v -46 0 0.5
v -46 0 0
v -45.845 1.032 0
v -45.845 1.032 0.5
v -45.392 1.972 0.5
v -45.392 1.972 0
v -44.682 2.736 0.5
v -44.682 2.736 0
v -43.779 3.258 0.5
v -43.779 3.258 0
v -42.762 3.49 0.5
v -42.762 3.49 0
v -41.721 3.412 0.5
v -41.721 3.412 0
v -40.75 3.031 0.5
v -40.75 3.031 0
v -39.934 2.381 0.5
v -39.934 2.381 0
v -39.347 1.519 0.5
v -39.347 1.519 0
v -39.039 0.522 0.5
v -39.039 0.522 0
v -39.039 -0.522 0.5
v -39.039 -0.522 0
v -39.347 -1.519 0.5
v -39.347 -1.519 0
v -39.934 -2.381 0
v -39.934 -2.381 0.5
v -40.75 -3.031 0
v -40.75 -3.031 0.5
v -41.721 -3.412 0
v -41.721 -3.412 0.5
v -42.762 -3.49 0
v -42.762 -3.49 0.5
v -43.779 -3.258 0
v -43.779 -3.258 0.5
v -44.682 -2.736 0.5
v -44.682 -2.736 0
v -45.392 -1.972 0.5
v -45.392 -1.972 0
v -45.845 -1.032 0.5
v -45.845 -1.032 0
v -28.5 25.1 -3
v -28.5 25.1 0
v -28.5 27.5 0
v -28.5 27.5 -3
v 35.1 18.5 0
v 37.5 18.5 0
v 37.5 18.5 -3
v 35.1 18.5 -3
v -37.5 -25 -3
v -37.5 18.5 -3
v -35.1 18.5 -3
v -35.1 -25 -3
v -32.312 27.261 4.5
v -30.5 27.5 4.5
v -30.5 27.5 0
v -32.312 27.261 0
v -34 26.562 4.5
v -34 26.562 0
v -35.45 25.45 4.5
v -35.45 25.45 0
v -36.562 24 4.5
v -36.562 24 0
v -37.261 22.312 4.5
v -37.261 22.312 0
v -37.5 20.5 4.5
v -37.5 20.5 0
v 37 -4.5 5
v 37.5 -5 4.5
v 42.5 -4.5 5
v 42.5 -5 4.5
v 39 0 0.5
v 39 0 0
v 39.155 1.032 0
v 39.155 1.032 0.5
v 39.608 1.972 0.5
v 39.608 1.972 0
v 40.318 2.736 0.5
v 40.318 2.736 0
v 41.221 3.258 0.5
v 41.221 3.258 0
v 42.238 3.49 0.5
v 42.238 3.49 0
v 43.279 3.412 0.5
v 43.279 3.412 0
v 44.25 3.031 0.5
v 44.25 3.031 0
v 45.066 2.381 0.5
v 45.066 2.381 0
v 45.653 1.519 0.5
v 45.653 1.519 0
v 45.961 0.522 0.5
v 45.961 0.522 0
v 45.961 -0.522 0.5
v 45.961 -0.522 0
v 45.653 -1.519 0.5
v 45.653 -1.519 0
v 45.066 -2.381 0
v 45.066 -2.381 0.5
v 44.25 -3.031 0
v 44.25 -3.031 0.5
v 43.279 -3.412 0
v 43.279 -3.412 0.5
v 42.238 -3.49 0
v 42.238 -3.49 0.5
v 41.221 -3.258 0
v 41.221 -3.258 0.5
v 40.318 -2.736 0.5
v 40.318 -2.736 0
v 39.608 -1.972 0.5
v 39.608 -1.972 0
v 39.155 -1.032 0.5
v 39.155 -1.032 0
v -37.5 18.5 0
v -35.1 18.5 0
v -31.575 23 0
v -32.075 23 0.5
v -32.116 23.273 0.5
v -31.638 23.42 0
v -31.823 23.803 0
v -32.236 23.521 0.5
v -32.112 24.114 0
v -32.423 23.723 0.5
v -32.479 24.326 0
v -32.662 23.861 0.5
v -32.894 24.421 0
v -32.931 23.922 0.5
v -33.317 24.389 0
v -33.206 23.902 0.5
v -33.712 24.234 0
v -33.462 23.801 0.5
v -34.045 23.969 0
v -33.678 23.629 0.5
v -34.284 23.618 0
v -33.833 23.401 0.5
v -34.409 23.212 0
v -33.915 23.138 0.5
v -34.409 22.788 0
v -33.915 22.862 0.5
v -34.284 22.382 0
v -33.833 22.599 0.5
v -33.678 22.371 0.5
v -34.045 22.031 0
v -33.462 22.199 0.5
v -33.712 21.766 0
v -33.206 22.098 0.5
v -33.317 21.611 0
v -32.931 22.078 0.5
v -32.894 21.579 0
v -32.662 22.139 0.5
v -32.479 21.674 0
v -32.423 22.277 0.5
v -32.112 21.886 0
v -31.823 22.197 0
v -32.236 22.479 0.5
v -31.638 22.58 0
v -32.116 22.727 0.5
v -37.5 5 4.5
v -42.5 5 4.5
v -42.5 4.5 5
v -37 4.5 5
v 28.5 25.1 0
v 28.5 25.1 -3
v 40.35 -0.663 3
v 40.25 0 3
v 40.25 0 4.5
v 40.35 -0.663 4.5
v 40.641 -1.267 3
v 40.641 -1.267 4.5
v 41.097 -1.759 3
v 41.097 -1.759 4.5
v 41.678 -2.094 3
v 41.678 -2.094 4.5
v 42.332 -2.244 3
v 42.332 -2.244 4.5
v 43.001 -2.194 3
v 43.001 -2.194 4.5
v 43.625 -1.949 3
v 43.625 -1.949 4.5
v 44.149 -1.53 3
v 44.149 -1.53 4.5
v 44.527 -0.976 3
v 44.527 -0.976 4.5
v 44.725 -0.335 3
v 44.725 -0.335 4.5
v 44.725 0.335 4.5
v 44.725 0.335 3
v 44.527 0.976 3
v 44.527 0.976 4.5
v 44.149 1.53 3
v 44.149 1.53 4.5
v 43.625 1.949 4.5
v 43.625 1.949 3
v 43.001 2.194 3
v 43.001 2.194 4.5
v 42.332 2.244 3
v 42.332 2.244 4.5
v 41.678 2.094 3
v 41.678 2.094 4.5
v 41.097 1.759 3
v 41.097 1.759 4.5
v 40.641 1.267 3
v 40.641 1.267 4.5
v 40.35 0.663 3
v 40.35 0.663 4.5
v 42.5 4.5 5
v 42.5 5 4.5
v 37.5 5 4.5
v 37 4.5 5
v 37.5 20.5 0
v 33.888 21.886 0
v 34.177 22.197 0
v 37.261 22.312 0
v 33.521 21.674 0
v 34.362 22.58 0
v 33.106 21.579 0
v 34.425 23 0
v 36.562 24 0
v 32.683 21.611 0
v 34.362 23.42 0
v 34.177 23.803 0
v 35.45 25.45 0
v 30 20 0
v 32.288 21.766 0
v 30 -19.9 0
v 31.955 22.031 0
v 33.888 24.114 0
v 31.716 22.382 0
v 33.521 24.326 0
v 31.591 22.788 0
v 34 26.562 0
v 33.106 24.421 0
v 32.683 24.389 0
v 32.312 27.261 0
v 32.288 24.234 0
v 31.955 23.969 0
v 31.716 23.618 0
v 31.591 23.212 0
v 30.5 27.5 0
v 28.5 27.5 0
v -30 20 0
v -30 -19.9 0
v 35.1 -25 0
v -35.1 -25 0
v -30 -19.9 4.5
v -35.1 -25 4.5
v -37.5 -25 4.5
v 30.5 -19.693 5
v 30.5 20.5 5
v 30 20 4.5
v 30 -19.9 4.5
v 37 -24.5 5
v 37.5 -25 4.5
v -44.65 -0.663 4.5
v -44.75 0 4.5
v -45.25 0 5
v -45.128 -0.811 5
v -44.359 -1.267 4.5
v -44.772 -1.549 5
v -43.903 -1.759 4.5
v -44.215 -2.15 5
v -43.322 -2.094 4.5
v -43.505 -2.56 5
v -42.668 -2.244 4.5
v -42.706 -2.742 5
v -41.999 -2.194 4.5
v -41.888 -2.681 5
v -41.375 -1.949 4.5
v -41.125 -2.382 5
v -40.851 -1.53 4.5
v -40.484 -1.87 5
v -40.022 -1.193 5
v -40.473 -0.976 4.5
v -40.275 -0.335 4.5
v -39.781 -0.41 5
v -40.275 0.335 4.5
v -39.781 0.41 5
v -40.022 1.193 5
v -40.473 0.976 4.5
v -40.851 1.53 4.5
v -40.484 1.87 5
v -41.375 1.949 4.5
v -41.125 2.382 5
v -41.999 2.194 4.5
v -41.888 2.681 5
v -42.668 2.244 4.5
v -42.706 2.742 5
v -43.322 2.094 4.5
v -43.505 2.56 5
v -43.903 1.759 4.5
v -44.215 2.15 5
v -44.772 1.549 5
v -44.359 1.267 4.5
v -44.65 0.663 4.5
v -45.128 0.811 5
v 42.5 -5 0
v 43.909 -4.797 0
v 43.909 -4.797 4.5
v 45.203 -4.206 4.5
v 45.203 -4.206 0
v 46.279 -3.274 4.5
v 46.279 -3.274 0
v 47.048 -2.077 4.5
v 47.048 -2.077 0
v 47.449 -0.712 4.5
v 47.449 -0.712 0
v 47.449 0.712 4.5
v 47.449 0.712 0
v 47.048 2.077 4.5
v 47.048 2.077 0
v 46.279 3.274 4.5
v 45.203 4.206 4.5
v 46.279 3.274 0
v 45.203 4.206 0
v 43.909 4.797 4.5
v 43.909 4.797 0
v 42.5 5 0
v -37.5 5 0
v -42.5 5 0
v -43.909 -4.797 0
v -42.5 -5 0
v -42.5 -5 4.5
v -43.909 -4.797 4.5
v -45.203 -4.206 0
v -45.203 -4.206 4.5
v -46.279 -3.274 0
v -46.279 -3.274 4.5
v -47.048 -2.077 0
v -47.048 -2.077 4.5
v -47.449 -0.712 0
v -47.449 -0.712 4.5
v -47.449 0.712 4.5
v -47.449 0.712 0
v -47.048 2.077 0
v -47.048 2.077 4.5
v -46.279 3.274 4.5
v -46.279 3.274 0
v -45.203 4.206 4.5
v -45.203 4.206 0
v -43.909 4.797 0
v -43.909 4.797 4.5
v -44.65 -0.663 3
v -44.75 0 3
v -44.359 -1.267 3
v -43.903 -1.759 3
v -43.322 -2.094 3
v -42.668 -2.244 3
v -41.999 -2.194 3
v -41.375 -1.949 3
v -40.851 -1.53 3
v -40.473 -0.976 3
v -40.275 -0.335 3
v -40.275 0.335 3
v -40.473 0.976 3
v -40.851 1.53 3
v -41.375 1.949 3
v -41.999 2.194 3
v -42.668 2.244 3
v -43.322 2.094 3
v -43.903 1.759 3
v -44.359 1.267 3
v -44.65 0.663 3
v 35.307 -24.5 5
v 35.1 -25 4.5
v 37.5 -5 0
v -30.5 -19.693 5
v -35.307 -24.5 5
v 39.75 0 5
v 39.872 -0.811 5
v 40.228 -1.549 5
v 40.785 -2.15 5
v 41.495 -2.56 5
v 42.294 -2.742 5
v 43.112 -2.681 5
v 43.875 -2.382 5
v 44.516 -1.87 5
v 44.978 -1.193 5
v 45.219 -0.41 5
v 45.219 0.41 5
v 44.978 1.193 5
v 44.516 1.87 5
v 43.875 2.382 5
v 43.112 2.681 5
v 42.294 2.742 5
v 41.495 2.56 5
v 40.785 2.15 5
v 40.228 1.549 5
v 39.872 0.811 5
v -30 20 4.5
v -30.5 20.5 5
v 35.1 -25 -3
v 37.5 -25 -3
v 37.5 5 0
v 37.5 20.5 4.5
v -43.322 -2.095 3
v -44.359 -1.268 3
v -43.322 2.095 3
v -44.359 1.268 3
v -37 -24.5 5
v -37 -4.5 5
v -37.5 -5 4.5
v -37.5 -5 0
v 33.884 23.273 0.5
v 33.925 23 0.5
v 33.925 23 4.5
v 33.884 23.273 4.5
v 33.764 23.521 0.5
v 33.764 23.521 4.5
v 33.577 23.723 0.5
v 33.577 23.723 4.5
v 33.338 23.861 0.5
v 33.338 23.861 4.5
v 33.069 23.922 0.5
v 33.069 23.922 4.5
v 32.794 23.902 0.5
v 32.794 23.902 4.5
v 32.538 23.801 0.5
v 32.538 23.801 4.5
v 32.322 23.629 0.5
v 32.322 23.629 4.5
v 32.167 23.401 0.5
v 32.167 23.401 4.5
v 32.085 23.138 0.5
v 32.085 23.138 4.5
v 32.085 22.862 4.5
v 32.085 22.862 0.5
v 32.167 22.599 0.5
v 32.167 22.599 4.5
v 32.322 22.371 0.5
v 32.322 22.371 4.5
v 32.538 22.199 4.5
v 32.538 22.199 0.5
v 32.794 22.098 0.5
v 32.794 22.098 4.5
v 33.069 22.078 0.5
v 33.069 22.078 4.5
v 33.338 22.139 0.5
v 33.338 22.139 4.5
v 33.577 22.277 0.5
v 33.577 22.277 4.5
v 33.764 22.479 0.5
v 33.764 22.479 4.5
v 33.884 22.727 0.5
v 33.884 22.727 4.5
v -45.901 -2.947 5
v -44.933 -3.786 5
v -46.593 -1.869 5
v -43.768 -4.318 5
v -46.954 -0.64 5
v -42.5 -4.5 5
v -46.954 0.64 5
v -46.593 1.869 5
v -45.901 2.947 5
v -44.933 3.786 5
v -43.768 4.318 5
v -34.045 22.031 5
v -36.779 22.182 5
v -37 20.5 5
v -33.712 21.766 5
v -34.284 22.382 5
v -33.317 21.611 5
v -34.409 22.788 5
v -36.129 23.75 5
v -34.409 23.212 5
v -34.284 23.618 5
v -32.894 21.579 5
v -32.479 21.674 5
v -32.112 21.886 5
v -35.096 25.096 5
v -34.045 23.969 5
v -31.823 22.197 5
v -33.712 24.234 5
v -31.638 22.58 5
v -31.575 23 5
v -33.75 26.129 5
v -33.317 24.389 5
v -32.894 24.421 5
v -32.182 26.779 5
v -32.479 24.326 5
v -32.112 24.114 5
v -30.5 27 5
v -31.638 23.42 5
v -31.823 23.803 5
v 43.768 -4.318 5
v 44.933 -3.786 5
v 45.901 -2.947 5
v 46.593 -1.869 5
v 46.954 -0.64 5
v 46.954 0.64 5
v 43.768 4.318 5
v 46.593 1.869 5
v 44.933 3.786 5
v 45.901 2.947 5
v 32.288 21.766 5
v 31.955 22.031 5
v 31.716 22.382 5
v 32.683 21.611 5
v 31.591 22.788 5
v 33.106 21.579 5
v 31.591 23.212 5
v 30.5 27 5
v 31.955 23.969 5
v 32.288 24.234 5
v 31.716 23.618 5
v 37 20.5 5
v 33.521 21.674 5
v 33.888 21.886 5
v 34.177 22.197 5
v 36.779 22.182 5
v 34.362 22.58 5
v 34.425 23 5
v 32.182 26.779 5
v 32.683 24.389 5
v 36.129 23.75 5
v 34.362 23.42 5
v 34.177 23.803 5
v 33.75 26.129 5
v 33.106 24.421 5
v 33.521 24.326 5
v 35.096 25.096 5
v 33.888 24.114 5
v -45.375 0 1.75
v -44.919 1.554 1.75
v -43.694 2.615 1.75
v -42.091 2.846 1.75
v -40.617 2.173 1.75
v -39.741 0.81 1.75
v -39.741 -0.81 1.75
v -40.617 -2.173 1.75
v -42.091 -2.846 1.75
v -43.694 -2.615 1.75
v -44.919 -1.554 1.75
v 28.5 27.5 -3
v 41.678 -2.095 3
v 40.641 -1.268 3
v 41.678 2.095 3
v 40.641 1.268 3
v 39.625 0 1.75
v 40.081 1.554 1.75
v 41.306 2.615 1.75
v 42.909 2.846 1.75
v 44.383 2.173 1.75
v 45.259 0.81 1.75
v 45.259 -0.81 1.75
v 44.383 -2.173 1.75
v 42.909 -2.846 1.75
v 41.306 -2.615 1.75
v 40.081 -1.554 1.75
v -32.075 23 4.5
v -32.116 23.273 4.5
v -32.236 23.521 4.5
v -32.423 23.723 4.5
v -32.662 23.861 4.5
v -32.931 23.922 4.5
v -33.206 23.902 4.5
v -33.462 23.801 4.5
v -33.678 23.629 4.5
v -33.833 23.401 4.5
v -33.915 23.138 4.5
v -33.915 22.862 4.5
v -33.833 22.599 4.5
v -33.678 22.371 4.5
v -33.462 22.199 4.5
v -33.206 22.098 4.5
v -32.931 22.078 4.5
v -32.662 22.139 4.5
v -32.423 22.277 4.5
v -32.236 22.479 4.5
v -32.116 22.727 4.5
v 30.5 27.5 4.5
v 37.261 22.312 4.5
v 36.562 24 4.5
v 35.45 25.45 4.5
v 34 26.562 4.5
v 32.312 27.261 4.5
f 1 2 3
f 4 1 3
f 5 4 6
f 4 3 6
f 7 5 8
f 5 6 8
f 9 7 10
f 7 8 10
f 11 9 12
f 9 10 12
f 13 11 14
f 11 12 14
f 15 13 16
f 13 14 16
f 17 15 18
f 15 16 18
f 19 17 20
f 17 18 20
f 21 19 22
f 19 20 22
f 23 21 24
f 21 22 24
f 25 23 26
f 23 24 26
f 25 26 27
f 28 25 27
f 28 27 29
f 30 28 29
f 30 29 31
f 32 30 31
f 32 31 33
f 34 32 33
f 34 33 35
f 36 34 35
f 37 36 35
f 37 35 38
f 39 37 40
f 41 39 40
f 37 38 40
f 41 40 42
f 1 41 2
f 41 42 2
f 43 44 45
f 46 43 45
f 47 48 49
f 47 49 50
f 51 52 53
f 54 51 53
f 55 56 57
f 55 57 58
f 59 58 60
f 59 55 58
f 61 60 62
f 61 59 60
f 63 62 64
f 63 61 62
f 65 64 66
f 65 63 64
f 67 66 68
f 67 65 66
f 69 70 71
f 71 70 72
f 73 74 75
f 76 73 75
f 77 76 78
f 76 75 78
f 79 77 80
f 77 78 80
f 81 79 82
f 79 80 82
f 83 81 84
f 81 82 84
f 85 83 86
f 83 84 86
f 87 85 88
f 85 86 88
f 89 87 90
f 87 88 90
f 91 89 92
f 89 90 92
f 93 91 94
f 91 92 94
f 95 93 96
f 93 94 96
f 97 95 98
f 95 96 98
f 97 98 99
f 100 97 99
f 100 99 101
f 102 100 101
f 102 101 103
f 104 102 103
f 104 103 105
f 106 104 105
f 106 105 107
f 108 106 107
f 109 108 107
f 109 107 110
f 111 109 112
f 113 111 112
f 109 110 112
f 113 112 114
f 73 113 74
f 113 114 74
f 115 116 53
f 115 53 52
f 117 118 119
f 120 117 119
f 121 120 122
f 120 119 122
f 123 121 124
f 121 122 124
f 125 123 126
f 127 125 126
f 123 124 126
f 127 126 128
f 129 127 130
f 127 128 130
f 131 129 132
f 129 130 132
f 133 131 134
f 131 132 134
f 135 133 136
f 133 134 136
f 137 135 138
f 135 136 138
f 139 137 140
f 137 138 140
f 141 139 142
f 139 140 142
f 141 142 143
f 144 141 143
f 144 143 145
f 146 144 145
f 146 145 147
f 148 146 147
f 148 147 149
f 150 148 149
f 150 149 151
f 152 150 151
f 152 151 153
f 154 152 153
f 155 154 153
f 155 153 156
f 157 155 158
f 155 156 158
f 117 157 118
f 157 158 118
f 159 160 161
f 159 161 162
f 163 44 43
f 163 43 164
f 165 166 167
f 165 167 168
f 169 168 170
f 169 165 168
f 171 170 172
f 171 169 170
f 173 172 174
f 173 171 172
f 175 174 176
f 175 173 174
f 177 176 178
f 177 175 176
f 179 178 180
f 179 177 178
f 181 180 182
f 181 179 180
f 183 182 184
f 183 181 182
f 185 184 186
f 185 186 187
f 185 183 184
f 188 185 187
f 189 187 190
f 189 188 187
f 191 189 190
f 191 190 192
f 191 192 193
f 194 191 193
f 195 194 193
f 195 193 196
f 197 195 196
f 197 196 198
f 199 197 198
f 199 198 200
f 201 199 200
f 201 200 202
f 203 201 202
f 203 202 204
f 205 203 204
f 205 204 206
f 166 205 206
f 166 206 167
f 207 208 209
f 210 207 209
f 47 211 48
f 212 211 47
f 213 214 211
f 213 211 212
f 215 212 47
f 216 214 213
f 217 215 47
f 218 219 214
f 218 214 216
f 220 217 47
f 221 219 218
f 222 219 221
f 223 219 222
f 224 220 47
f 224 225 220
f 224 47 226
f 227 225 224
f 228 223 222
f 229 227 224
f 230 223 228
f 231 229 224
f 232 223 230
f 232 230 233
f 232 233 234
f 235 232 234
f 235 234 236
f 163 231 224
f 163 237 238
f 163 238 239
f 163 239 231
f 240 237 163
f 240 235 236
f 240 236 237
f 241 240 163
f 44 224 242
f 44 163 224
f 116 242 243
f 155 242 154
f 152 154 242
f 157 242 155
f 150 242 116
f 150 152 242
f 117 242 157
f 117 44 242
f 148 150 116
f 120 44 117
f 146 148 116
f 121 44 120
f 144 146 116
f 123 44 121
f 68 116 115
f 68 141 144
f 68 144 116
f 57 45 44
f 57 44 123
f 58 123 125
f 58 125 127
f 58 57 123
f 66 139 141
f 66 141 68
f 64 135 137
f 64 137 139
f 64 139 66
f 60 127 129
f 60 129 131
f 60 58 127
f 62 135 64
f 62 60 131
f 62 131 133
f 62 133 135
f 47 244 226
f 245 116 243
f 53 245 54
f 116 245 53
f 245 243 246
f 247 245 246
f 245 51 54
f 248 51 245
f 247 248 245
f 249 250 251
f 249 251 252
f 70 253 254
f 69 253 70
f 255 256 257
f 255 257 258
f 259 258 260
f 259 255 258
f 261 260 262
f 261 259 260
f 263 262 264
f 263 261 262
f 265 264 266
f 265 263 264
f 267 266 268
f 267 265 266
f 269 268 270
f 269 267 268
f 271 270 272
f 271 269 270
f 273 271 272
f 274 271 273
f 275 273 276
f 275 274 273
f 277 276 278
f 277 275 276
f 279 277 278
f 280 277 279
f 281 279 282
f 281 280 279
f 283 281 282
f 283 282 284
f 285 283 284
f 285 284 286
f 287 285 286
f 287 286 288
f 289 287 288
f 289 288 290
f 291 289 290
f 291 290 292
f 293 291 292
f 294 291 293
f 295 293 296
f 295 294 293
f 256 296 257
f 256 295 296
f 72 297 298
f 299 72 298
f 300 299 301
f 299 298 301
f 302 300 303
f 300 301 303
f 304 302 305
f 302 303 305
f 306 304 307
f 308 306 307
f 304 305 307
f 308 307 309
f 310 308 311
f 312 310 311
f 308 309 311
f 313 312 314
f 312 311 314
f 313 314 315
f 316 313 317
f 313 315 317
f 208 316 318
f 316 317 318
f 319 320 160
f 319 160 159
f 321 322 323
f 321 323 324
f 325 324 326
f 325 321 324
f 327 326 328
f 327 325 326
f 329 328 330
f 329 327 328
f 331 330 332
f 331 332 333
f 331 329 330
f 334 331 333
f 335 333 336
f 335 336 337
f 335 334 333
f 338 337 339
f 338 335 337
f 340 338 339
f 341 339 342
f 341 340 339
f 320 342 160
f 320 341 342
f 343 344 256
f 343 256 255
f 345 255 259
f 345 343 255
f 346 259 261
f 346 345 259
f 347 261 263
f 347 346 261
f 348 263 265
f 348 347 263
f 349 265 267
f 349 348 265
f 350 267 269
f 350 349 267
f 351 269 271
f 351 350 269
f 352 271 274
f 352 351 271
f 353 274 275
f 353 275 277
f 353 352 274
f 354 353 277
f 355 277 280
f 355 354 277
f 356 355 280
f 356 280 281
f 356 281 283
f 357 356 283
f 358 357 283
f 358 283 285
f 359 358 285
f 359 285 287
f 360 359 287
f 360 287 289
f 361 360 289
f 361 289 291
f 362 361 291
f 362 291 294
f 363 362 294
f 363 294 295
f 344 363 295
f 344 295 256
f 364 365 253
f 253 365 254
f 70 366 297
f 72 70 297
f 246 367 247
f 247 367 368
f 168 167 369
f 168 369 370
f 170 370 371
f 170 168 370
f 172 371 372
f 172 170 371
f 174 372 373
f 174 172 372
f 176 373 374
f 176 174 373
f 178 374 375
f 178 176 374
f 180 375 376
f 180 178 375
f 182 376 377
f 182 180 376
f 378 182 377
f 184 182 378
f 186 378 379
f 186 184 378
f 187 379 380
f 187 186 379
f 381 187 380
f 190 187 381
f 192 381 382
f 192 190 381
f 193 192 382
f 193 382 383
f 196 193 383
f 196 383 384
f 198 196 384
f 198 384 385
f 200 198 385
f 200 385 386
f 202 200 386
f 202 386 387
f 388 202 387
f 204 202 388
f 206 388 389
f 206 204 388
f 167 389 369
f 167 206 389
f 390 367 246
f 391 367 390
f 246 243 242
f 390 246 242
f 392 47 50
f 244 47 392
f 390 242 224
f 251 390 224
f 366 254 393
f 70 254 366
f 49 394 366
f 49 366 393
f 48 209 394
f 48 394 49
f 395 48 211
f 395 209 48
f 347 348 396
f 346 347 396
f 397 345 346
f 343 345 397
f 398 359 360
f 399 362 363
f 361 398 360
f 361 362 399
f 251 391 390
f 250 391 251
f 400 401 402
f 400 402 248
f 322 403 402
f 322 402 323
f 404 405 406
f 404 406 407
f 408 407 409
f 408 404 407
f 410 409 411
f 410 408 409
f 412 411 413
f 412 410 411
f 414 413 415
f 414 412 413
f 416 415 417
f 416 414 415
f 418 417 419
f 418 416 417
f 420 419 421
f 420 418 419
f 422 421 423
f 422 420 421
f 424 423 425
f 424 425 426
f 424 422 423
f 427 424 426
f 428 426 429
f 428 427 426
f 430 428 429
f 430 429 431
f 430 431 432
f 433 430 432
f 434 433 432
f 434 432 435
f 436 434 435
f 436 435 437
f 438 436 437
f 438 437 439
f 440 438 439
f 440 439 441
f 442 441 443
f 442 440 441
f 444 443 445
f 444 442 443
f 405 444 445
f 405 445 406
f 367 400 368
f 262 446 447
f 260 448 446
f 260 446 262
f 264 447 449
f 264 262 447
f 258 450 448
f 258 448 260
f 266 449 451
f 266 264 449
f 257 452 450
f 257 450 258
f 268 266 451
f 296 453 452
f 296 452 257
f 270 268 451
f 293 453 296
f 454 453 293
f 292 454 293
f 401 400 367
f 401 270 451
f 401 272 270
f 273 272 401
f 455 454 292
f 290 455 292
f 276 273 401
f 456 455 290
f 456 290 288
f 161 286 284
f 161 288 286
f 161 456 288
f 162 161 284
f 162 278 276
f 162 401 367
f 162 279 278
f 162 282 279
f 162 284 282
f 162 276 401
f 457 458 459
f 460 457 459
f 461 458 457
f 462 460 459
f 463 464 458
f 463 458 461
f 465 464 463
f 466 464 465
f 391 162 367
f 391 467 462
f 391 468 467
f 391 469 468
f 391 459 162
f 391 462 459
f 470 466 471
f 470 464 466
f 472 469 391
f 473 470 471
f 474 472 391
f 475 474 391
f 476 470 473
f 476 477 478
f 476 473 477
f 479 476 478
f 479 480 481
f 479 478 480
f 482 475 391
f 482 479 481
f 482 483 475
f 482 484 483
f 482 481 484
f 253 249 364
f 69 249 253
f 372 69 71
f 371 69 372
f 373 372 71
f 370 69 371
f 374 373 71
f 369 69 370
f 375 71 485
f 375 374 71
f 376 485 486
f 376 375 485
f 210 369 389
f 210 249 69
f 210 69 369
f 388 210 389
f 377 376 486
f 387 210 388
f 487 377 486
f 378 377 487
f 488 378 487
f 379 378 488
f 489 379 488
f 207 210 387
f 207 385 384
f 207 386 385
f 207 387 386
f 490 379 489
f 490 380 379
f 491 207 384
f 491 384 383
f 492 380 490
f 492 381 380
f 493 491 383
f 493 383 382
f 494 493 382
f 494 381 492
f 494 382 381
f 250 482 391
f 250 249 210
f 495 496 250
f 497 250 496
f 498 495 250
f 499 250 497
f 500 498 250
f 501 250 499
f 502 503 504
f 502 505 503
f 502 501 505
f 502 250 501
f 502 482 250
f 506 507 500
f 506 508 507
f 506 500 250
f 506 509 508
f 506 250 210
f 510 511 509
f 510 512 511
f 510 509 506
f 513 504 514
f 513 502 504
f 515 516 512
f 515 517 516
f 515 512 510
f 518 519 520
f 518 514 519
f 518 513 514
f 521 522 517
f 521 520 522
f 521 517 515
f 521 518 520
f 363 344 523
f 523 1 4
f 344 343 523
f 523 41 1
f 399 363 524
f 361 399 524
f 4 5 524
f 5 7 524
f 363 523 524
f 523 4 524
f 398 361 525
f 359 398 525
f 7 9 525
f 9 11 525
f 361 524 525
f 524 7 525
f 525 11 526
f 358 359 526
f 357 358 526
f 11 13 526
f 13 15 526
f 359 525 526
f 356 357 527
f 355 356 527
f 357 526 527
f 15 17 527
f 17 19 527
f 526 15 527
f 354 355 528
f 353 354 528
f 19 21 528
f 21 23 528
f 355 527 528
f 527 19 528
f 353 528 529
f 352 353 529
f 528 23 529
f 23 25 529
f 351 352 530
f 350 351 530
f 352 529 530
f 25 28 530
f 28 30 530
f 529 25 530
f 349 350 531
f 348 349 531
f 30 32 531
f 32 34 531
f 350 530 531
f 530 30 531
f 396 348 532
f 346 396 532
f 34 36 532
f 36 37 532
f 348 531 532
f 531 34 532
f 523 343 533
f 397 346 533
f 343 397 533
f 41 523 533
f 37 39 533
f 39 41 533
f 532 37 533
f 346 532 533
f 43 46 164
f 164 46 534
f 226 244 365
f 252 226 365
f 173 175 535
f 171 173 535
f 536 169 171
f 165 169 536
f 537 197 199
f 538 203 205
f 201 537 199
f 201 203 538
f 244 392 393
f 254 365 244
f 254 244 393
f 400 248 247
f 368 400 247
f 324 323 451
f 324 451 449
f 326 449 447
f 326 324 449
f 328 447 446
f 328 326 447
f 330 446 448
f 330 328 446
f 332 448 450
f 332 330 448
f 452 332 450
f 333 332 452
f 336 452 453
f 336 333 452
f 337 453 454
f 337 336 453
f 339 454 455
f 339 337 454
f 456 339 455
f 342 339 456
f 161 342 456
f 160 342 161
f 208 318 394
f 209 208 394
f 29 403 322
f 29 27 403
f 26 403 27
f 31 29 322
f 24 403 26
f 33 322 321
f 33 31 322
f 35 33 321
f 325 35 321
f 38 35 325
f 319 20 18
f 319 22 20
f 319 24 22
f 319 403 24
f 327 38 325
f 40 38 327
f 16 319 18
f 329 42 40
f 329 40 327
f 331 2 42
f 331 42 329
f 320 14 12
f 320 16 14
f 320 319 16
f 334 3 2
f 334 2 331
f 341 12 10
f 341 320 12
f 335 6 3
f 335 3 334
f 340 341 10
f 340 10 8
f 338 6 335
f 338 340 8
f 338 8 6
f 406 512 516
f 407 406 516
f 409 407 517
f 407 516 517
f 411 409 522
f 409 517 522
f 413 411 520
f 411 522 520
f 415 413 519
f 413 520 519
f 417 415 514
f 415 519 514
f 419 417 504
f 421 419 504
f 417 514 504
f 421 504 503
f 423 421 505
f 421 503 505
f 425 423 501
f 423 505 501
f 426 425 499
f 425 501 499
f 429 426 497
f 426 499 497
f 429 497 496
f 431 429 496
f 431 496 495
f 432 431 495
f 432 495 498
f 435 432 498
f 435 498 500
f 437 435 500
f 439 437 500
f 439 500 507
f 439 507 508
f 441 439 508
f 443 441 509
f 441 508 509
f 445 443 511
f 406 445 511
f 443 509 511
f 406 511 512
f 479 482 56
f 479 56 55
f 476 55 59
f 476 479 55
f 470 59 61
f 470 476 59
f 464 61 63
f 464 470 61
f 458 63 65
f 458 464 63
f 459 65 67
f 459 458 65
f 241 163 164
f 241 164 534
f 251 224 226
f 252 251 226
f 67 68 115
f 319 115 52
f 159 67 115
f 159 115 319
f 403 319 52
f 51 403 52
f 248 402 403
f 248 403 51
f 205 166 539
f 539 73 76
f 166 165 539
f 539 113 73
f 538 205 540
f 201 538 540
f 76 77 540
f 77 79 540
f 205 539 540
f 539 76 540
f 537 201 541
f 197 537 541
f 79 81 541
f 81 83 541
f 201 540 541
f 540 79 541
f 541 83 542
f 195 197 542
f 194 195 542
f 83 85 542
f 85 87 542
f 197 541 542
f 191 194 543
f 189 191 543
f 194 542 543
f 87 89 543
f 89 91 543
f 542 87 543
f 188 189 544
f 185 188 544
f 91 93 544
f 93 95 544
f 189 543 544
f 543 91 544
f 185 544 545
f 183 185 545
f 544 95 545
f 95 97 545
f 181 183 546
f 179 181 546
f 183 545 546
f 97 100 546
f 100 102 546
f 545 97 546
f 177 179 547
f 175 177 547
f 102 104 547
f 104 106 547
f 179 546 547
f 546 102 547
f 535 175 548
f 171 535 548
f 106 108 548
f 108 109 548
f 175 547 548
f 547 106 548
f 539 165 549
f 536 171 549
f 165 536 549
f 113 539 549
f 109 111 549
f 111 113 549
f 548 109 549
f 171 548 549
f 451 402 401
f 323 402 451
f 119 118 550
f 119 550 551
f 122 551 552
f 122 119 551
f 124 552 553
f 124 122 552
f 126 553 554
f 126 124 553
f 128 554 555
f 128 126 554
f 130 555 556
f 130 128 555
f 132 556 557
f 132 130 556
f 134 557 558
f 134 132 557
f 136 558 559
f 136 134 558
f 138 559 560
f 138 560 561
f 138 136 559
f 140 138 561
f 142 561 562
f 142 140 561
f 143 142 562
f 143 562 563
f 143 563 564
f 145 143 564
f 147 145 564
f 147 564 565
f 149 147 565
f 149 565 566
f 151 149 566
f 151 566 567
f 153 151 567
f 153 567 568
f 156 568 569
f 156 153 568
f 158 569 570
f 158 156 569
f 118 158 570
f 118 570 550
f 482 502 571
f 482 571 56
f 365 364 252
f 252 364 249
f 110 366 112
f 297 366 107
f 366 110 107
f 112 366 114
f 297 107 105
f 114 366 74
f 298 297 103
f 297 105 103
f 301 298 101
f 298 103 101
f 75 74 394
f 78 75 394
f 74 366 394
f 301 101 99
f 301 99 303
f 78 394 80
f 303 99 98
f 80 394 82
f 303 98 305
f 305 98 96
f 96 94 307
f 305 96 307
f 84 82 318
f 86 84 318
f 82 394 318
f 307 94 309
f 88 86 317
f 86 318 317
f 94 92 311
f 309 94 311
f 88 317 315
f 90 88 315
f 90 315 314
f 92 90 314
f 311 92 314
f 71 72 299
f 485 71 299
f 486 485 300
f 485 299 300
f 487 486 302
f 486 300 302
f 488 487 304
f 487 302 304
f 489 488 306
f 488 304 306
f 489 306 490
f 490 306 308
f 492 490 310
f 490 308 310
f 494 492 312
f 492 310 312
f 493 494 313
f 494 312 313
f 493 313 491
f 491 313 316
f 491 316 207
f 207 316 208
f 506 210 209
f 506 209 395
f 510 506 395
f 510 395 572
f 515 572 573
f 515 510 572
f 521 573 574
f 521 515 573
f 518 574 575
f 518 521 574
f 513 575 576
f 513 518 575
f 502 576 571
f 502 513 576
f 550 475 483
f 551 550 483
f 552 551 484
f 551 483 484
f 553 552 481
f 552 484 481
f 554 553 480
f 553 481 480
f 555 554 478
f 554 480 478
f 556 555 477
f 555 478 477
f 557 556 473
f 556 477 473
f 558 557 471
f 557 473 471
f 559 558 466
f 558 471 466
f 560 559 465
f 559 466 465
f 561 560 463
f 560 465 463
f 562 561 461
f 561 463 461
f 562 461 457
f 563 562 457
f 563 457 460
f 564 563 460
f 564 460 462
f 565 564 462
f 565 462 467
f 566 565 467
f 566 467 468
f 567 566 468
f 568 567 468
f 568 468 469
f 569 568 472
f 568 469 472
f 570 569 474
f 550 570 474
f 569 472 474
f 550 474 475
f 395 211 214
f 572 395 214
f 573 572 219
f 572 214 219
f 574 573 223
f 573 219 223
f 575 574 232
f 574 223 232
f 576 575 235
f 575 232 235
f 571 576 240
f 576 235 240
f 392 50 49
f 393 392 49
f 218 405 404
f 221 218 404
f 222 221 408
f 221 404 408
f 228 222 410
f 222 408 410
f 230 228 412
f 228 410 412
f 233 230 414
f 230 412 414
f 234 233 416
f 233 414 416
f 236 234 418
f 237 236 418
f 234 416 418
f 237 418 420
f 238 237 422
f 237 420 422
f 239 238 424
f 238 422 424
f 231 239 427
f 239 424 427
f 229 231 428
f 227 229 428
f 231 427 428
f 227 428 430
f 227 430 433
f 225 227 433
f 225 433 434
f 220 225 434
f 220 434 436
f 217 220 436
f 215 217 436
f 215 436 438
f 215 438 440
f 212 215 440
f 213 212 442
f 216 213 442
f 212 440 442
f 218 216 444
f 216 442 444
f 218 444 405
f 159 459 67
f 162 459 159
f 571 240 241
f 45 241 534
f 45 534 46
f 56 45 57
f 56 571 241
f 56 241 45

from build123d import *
from OCP.BRepFilletAPI import BRepFilletAPI_MakeChamfer

# Parameters (mm, degrees)
SKETCH1_R           = 0.925
BOSS_EXTRUDE1_DEPTH = 5
BOSS_EXTRUDE2_DEPTH = 3
SKETCH7_W           = 9
SKETCH7_H           = 9
CUT_EXTRUDE3_DEPTH  = 47.770717335
SKETCH3_R           = 2.25
BOSS_EXTRUDE3_DEPTH = 5
SKETCH4_R           = 3.5
CUT_EXTRUDE1_DEPTH  = 3
CHAMFER2_SIZE       = 5.1
FILLET1_R           = 7
CHAMFER3_SIZE       = 0.5
CHAMFER1_SIZE       = 1.25
CHAMFER1_SIZE_2     = 2.5


with BuildPart() as part:
    # Sketch1 → Boss-Extrude1 (new body)
    with BuildSketch(Plane.XY):
        Polygon((-30, -25), (-30, 20), (30, 20), (30, -25), (37.5, -25), (37.5, 27.5), (-37.5, 27.5), (-37.5, -25), align=None)
        with Locations((-33, 23)):
            Circle(SKETCH1_R, mode=Mode.SUBTRACT)
        with Locations((33, 23)):
            Circle(SKETCH1_R, mode=Mode.SUBTRACT)
    extrude(amount=BOSS_EXTRUDE1_DEPTH)

    # Sketch2 → Boss-Extrude2 (add)
    with BuildSketch(Plane.XY):
        Polygon((37.5, 27.5), (30, 27.5), (-30, 27.5), (-37.5, 27.5), (-37.5, -25), (-35.1, -25), (-35.1, 25.1), (35.1, 25.1), (35.1, -25), (37.5, -25), align=None)
    extrude(amount=-BOSS_EXTRUDE2_DEPTH)

    # Sketch7 → Cut-Extrude3 (cut, through all)
    with BuildSketch(Plane(origin=(0, 0, 0), x_dir=(-1, 0, 0), z_dir=(0, 0, -1))):
        with Locations((-33, 23)):
            Rectangle(SKETCH7_W, SKETCH7_H)
        with Locations((33, 23)):
            Rectangle(SKETCH7_W, SKETCH7_H)
    extrude(amount=CUT_EXTRUDE3_DEPTH, mode=Mode.SUBTRACT)

    # Sketch3 → Boss-Extrude3 (add)
    # profile 1 of 2: a face of its own
    with BuildSketch(Plane.XY):
        with BuildLine():
            Line((42.5, 5), (37.5, 5))
            Line((37.5, 5), (37.5, -5))
            Line((37.5, -5), (42.5, -5))
            ThreePointArc((42.5, -5), (47.5, 0), (42.5, 5))
        make_face()
        with Locations(Location((42.5, 0, 0), (0, 0, 180))):
            Circle(SKETCH3_R, mode=Mode.SUBTRACT)
    # profile 2 of 2: a face of its own
    with BuildSketch(Plane.XY):
        with BuildLine():
            Line((-42.5, 5), (-37.5, 5))
            Line((-37.5, 5), (-37.5, -5))
            Line((-37.5, -5), (-42.5, -5))
            ThreePointArc((-42.5, -5), (-47.5, 0), (-42.5, 5))
        make_face()
        with Locations(Location((-42.5, 0, 0), (0, 0, 180))):
            Circle(SKETCH3_R, mode=Mode.SUBTRACT)
    extrude(amount=BOSS_EXTRUDE3_DEPTH)

    # Sketch4 → Cut-Extrude1 (cut)
    with BuildSketch(Plane(origin=(0, 0, 0), x_dir=(-1, 0, 0), z_dir=(0, 0, -1))):
        with Locations((-42.5, 0)):
            Circle(SKETCH4_R)
        with Locations((42.5, 0)):
            Circle(SKETCH4_R)
    extrude(amount=-CUT_EXTRUDE1_DEPTH, mode=Mode.SUBTRACT)

    # Chamfer2
    chamfer2_edges = [part.edges().sort_by_distance(p)[0] for p in [
        (-30, -25, 2.5),
        (30, -25, 2.5),
    ]]
    chamfer(chamfer2_edges, length=CHAMFER2_SIZE)

    # Fillet1
    fillet1_edges = [part.edges().sort_by_distance(p)[0] for p in [
        (-37.5, 27.5, 2.5),
        (37.5, 27.5, 2.5),
    ]]
    fillet(fillet1_edges, radius=FILLET1_R)

    # Chamfer3
    chamfer3_edges = [part.edges().sort_by_distance(p)[0] for p in [
        (37.5, 12.75, 5),
        (47.5, 0, 5),
        (40, 5, 5),
        (40, -5, 5),
        (44.75, 0, 5),
        (-37.5, -15, 5),
        (-47.5, 0, 5),
        (-40, -5, 5),
        (-40, 5, 5),
        (-40.25, 0, 5),
        (0, 20, 5),
        (-30, 0.05, 5),
        (36.3, -25, 5),
        (32.55, -22.45, 5),
        (-32.55, -22.45, 5),
        (-37.5, 12.75, 5),
        (0, 27.5, 5),
        (35.449747468, 25.449747468, 5),
        (-35.449747468, 25.449747468, 5),
        (30, 0.05, 5),
        (-33.925, 23, 0),
        (-33.925, 23, 5),
        (37.5, -15, 5),
        (32.075, 23, 0),
        (32.075, 23, 5),
        (-36.3, -25, 5),
    ]]
    chamfer(chamfer3_edges, length=CHAMFER3_SIZE)

    # Chamfer1
    chamfer1_edges_1 = [part.edges().sort_by_distance(p)[0] for p in [
        (46, 0, 3),
    ]]
    chamfer1_side_1 = [part.faces().sort_by_distance(p)[0] for p in [
        (45.975, 0, 3),
    ]]
    chamfer1_edges_2 = [part.edges().sort_by_distance(p)[0] for p in [
        (-39, 0, 3),
    ]]
    chamfer1_side_2 = [part.faces().sort_by_distance(p)[0] for p in [
        (-39.025, 0, 3),
    ]]
    chamfer1 = BRepFilletAPI_MakeChamfer(part.part.solid().wrapped)
    for e in chamfer1_edges_1:
        chamfer1.Add(CHAMFER1_SIZE - 0.0001, CHAMFER1_SIZE_2 - 0.0001, e.wrapped, chamfer1_side_1[0].wrapped)
    for e in chamfer1_edges_2:
        chamfer1.Add(CHAMFER1_SIZE - 0.0001, CHAMFER1_SIZE_2 - 0.0001, e.wrapped, chamfer1_side_2[0].wrapped)
    add(Compound.cast(chamfer1.Shape()), mode=Mode.REPLACE)  # a hair under: the kernel refuses the full size


solid = part.part
